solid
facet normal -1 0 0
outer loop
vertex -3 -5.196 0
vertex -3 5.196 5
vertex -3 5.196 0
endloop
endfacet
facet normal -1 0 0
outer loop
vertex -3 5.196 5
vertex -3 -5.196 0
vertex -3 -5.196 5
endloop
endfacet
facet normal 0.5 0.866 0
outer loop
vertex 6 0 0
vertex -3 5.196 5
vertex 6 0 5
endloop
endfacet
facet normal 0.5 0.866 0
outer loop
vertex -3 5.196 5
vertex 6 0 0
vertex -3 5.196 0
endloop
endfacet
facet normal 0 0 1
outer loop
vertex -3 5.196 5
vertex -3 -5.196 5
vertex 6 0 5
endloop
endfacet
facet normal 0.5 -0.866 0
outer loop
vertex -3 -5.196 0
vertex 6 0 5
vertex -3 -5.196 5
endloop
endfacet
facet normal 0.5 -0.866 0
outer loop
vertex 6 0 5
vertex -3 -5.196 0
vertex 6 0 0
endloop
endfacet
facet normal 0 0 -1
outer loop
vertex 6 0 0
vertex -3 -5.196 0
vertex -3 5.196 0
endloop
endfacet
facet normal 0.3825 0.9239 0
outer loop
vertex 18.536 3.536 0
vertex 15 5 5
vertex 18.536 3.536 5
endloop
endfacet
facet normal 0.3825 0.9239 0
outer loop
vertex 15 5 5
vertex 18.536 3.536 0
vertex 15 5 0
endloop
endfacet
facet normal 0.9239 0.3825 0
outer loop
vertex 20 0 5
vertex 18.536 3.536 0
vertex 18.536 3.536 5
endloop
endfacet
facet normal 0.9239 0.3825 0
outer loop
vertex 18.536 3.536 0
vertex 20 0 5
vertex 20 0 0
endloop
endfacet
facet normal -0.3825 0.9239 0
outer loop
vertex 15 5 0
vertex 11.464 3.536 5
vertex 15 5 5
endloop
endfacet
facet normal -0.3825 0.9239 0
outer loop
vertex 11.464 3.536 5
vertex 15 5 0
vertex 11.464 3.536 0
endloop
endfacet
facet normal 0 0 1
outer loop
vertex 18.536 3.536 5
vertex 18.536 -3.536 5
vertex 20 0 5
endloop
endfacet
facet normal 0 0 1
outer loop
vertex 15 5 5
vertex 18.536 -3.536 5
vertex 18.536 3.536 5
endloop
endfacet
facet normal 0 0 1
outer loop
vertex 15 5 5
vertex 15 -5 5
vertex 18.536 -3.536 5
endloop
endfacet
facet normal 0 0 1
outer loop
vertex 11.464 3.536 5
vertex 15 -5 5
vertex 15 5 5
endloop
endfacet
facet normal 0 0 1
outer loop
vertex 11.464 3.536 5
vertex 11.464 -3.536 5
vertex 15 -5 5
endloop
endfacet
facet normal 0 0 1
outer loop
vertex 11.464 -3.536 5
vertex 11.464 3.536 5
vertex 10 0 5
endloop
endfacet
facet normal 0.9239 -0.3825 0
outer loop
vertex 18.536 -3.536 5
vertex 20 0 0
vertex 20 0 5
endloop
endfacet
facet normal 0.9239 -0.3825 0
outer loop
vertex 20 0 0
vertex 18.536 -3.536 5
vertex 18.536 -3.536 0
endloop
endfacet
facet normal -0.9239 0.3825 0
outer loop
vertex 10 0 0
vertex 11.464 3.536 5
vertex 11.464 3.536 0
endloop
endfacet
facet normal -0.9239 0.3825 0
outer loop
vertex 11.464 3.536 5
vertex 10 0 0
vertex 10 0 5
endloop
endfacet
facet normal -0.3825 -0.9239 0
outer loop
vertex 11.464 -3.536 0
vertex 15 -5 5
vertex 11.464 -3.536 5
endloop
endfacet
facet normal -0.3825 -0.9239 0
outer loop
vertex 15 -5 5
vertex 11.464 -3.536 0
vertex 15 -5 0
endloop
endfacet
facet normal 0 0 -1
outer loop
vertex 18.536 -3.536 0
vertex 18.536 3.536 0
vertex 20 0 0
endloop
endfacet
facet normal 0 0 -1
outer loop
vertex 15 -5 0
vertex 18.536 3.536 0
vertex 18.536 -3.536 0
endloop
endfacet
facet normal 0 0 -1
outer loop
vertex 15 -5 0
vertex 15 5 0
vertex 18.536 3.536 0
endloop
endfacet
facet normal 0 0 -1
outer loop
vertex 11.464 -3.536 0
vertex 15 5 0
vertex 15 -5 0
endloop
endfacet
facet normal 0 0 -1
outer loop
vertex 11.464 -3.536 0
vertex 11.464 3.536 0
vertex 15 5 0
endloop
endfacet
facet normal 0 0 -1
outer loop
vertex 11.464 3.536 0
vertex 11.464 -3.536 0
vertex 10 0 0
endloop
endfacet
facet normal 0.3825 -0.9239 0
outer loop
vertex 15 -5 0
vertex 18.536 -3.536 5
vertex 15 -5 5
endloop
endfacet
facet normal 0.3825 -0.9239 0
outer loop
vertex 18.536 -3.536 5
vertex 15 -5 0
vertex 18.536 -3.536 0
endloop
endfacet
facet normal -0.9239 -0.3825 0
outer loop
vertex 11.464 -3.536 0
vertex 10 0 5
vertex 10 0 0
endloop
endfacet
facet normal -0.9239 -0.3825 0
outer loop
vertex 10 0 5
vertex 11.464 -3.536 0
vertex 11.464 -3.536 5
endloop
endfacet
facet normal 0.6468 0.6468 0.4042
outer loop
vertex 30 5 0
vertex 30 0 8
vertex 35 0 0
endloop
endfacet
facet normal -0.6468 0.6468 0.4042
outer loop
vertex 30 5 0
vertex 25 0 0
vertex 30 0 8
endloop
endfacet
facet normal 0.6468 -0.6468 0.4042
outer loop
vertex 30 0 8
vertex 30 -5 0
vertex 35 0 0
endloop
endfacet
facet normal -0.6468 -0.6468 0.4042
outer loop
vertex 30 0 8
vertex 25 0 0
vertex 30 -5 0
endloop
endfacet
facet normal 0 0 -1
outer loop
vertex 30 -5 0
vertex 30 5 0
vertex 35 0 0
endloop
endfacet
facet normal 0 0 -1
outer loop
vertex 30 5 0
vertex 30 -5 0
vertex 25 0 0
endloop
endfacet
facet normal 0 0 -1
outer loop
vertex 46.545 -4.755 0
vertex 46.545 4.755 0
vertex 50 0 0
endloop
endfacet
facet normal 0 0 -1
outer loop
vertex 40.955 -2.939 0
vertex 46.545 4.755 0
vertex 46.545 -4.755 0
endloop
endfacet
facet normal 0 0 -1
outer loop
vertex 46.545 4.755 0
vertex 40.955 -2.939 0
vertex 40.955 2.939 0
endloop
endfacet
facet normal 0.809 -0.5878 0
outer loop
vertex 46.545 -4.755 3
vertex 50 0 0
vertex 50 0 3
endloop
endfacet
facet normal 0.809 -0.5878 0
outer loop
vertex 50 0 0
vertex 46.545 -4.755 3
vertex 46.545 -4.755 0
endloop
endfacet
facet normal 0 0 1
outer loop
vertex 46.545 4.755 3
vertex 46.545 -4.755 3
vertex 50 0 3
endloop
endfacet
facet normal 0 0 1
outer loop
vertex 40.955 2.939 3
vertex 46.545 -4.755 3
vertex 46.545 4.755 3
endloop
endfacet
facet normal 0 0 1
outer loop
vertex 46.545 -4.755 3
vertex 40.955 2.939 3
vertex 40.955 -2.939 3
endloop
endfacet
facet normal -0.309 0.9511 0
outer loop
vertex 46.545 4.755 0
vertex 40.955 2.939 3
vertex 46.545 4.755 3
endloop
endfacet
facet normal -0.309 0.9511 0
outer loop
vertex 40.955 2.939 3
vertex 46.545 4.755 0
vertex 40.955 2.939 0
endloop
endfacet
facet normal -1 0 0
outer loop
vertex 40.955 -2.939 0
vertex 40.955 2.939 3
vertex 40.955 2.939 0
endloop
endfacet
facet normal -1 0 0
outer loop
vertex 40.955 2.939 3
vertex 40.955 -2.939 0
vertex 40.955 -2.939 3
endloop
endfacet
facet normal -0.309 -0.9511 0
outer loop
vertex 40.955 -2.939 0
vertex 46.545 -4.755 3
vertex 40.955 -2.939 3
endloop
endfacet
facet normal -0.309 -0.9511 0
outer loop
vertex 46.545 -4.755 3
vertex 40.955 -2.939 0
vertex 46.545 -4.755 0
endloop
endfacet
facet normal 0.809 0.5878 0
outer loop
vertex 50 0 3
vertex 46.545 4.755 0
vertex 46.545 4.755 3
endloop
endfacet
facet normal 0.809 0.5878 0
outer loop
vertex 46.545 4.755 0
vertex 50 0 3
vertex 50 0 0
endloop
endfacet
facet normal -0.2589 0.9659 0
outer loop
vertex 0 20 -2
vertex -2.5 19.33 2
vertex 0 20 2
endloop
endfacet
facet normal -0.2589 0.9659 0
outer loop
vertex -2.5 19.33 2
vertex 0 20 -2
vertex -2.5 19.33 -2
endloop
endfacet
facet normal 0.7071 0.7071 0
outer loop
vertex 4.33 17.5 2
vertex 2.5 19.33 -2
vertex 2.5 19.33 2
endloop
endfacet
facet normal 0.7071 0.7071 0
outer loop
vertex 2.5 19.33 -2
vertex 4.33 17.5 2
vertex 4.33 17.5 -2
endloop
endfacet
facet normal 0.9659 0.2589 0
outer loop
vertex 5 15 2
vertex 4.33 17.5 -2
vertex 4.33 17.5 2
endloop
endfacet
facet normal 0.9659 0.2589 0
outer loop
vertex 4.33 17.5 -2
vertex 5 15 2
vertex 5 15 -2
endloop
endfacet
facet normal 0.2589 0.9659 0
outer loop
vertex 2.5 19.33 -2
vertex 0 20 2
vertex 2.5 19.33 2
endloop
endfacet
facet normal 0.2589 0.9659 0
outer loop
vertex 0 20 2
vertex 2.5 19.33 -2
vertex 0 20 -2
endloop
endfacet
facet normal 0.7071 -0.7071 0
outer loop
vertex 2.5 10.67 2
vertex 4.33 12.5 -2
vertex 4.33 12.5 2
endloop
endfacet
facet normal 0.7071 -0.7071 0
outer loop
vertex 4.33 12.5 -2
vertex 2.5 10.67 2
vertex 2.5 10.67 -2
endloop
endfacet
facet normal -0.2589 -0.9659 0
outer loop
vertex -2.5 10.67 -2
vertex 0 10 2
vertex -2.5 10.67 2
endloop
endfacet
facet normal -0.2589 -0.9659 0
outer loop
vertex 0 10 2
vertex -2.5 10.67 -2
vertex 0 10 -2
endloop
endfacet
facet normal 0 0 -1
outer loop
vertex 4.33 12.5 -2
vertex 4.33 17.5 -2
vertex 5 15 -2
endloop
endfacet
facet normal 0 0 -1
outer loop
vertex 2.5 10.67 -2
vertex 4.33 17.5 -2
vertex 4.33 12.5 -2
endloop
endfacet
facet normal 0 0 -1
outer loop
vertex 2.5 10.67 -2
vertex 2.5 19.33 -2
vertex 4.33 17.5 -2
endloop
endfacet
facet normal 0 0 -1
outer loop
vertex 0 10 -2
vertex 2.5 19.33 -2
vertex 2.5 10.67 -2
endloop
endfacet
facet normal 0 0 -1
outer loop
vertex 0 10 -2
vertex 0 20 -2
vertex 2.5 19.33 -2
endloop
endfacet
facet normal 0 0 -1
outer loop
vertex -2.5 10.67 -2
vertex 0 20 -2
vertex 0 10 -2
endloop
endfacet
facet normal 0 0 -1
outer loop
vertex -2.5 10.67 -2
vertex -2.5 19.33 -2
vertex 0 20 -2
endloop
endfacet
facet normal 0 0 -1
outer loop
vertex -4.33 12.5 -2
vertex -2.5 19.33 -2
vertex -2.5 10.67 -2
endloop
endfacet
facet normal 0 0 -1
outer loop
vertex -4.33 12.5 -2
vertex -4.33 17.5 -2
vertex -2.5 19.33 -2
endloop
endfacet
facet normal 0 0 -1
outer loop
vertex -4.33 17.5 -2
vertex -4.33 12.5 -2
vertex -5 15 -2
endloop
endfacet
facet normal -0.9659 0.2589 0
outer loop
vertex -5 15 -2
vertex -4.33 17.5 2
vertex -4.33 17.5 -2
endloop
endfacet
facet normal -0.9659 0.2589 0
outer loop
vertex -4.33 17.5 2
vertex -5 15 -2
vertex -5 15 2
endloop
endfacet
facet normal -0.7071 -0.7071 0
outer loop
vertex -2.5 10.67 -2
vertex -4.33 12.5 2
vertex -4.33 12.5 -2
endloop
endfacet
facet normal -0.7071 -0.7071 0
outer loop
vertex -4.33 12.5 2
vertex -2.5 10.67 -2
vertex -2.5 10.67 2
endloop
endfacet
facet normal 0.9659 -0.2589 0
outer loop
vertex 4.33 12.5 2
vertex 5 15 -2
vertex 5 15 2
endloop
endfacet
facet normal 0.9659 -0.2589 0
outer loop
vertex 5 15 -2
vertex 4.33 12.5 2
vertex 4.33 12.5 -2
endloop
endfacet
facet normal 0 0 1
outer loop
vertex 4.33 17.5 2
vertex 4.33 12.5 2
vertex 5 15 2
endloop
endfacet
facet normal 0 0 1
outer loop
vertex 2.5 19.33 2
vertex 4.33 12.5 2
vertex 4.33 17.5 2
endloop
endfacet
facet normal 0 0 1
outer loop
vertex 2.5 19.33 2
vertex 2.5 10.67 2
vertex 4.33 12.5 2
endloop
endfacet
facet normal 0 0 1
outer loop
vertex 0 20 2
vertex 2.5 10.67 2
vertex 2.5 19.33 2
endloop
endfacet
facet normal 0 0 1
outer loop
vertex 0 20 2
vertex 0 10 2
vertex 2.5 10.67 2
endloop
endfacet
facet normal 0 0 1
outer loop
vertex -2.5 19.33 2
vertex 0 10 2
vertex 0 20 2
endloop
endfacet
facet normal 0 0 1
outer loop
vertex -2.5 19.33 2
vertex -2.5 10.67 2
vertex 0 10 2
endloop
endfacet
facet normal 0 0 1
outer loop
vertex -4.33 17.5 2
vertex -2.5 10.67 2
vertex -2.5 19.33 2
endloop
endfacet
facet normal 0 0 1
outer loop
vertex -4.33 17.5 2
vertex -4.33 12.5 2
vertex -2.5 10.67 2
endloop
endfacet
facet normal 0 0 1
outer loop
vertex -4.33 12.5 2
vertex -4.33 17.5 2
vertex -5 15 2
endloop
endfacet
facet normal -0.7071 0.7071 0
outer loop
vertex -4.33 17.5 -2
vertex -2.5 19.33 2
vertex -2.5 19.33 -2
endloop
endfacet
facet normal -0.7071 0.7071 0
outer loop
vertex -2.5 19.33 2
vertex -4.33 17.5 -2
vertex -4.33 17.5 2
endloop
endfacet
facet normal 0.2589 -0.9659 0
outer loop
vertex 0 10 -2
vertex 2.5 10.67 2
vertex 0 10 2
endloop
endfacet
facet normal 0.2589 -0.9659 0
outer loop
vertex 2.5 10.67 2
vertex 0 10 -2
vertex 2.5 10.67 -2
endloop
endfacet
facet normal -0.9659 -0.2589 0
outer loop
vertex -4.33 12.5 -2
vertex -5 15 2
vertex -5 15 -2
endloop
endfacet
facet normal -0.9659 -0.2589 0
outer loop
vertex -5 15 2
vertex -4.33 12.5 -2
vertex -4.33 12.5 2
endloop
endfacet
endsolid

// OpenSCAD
// Zweck: $fn = 3…12 at the call yields polygons as in OpenSCAD – triangle, octagon, pyramid, 2D pentagon.
cylinder(h = 5, r = 6, $fn = 3);
translate([15, 0, 0]) cylinder(h = 5, d = 10, $fn = 8);
translate([30, 0, 0]) cylinder(h = 8, r1 = 5, r2 = 0, $fn = 4);
translate([45, 0, 0]) linear_extrude(height = 3) circle(r = 5, $fn = 5);
translate([0, 15, 0]) cylinder(h = 4, r = 5, center = true, $fn = 12);
